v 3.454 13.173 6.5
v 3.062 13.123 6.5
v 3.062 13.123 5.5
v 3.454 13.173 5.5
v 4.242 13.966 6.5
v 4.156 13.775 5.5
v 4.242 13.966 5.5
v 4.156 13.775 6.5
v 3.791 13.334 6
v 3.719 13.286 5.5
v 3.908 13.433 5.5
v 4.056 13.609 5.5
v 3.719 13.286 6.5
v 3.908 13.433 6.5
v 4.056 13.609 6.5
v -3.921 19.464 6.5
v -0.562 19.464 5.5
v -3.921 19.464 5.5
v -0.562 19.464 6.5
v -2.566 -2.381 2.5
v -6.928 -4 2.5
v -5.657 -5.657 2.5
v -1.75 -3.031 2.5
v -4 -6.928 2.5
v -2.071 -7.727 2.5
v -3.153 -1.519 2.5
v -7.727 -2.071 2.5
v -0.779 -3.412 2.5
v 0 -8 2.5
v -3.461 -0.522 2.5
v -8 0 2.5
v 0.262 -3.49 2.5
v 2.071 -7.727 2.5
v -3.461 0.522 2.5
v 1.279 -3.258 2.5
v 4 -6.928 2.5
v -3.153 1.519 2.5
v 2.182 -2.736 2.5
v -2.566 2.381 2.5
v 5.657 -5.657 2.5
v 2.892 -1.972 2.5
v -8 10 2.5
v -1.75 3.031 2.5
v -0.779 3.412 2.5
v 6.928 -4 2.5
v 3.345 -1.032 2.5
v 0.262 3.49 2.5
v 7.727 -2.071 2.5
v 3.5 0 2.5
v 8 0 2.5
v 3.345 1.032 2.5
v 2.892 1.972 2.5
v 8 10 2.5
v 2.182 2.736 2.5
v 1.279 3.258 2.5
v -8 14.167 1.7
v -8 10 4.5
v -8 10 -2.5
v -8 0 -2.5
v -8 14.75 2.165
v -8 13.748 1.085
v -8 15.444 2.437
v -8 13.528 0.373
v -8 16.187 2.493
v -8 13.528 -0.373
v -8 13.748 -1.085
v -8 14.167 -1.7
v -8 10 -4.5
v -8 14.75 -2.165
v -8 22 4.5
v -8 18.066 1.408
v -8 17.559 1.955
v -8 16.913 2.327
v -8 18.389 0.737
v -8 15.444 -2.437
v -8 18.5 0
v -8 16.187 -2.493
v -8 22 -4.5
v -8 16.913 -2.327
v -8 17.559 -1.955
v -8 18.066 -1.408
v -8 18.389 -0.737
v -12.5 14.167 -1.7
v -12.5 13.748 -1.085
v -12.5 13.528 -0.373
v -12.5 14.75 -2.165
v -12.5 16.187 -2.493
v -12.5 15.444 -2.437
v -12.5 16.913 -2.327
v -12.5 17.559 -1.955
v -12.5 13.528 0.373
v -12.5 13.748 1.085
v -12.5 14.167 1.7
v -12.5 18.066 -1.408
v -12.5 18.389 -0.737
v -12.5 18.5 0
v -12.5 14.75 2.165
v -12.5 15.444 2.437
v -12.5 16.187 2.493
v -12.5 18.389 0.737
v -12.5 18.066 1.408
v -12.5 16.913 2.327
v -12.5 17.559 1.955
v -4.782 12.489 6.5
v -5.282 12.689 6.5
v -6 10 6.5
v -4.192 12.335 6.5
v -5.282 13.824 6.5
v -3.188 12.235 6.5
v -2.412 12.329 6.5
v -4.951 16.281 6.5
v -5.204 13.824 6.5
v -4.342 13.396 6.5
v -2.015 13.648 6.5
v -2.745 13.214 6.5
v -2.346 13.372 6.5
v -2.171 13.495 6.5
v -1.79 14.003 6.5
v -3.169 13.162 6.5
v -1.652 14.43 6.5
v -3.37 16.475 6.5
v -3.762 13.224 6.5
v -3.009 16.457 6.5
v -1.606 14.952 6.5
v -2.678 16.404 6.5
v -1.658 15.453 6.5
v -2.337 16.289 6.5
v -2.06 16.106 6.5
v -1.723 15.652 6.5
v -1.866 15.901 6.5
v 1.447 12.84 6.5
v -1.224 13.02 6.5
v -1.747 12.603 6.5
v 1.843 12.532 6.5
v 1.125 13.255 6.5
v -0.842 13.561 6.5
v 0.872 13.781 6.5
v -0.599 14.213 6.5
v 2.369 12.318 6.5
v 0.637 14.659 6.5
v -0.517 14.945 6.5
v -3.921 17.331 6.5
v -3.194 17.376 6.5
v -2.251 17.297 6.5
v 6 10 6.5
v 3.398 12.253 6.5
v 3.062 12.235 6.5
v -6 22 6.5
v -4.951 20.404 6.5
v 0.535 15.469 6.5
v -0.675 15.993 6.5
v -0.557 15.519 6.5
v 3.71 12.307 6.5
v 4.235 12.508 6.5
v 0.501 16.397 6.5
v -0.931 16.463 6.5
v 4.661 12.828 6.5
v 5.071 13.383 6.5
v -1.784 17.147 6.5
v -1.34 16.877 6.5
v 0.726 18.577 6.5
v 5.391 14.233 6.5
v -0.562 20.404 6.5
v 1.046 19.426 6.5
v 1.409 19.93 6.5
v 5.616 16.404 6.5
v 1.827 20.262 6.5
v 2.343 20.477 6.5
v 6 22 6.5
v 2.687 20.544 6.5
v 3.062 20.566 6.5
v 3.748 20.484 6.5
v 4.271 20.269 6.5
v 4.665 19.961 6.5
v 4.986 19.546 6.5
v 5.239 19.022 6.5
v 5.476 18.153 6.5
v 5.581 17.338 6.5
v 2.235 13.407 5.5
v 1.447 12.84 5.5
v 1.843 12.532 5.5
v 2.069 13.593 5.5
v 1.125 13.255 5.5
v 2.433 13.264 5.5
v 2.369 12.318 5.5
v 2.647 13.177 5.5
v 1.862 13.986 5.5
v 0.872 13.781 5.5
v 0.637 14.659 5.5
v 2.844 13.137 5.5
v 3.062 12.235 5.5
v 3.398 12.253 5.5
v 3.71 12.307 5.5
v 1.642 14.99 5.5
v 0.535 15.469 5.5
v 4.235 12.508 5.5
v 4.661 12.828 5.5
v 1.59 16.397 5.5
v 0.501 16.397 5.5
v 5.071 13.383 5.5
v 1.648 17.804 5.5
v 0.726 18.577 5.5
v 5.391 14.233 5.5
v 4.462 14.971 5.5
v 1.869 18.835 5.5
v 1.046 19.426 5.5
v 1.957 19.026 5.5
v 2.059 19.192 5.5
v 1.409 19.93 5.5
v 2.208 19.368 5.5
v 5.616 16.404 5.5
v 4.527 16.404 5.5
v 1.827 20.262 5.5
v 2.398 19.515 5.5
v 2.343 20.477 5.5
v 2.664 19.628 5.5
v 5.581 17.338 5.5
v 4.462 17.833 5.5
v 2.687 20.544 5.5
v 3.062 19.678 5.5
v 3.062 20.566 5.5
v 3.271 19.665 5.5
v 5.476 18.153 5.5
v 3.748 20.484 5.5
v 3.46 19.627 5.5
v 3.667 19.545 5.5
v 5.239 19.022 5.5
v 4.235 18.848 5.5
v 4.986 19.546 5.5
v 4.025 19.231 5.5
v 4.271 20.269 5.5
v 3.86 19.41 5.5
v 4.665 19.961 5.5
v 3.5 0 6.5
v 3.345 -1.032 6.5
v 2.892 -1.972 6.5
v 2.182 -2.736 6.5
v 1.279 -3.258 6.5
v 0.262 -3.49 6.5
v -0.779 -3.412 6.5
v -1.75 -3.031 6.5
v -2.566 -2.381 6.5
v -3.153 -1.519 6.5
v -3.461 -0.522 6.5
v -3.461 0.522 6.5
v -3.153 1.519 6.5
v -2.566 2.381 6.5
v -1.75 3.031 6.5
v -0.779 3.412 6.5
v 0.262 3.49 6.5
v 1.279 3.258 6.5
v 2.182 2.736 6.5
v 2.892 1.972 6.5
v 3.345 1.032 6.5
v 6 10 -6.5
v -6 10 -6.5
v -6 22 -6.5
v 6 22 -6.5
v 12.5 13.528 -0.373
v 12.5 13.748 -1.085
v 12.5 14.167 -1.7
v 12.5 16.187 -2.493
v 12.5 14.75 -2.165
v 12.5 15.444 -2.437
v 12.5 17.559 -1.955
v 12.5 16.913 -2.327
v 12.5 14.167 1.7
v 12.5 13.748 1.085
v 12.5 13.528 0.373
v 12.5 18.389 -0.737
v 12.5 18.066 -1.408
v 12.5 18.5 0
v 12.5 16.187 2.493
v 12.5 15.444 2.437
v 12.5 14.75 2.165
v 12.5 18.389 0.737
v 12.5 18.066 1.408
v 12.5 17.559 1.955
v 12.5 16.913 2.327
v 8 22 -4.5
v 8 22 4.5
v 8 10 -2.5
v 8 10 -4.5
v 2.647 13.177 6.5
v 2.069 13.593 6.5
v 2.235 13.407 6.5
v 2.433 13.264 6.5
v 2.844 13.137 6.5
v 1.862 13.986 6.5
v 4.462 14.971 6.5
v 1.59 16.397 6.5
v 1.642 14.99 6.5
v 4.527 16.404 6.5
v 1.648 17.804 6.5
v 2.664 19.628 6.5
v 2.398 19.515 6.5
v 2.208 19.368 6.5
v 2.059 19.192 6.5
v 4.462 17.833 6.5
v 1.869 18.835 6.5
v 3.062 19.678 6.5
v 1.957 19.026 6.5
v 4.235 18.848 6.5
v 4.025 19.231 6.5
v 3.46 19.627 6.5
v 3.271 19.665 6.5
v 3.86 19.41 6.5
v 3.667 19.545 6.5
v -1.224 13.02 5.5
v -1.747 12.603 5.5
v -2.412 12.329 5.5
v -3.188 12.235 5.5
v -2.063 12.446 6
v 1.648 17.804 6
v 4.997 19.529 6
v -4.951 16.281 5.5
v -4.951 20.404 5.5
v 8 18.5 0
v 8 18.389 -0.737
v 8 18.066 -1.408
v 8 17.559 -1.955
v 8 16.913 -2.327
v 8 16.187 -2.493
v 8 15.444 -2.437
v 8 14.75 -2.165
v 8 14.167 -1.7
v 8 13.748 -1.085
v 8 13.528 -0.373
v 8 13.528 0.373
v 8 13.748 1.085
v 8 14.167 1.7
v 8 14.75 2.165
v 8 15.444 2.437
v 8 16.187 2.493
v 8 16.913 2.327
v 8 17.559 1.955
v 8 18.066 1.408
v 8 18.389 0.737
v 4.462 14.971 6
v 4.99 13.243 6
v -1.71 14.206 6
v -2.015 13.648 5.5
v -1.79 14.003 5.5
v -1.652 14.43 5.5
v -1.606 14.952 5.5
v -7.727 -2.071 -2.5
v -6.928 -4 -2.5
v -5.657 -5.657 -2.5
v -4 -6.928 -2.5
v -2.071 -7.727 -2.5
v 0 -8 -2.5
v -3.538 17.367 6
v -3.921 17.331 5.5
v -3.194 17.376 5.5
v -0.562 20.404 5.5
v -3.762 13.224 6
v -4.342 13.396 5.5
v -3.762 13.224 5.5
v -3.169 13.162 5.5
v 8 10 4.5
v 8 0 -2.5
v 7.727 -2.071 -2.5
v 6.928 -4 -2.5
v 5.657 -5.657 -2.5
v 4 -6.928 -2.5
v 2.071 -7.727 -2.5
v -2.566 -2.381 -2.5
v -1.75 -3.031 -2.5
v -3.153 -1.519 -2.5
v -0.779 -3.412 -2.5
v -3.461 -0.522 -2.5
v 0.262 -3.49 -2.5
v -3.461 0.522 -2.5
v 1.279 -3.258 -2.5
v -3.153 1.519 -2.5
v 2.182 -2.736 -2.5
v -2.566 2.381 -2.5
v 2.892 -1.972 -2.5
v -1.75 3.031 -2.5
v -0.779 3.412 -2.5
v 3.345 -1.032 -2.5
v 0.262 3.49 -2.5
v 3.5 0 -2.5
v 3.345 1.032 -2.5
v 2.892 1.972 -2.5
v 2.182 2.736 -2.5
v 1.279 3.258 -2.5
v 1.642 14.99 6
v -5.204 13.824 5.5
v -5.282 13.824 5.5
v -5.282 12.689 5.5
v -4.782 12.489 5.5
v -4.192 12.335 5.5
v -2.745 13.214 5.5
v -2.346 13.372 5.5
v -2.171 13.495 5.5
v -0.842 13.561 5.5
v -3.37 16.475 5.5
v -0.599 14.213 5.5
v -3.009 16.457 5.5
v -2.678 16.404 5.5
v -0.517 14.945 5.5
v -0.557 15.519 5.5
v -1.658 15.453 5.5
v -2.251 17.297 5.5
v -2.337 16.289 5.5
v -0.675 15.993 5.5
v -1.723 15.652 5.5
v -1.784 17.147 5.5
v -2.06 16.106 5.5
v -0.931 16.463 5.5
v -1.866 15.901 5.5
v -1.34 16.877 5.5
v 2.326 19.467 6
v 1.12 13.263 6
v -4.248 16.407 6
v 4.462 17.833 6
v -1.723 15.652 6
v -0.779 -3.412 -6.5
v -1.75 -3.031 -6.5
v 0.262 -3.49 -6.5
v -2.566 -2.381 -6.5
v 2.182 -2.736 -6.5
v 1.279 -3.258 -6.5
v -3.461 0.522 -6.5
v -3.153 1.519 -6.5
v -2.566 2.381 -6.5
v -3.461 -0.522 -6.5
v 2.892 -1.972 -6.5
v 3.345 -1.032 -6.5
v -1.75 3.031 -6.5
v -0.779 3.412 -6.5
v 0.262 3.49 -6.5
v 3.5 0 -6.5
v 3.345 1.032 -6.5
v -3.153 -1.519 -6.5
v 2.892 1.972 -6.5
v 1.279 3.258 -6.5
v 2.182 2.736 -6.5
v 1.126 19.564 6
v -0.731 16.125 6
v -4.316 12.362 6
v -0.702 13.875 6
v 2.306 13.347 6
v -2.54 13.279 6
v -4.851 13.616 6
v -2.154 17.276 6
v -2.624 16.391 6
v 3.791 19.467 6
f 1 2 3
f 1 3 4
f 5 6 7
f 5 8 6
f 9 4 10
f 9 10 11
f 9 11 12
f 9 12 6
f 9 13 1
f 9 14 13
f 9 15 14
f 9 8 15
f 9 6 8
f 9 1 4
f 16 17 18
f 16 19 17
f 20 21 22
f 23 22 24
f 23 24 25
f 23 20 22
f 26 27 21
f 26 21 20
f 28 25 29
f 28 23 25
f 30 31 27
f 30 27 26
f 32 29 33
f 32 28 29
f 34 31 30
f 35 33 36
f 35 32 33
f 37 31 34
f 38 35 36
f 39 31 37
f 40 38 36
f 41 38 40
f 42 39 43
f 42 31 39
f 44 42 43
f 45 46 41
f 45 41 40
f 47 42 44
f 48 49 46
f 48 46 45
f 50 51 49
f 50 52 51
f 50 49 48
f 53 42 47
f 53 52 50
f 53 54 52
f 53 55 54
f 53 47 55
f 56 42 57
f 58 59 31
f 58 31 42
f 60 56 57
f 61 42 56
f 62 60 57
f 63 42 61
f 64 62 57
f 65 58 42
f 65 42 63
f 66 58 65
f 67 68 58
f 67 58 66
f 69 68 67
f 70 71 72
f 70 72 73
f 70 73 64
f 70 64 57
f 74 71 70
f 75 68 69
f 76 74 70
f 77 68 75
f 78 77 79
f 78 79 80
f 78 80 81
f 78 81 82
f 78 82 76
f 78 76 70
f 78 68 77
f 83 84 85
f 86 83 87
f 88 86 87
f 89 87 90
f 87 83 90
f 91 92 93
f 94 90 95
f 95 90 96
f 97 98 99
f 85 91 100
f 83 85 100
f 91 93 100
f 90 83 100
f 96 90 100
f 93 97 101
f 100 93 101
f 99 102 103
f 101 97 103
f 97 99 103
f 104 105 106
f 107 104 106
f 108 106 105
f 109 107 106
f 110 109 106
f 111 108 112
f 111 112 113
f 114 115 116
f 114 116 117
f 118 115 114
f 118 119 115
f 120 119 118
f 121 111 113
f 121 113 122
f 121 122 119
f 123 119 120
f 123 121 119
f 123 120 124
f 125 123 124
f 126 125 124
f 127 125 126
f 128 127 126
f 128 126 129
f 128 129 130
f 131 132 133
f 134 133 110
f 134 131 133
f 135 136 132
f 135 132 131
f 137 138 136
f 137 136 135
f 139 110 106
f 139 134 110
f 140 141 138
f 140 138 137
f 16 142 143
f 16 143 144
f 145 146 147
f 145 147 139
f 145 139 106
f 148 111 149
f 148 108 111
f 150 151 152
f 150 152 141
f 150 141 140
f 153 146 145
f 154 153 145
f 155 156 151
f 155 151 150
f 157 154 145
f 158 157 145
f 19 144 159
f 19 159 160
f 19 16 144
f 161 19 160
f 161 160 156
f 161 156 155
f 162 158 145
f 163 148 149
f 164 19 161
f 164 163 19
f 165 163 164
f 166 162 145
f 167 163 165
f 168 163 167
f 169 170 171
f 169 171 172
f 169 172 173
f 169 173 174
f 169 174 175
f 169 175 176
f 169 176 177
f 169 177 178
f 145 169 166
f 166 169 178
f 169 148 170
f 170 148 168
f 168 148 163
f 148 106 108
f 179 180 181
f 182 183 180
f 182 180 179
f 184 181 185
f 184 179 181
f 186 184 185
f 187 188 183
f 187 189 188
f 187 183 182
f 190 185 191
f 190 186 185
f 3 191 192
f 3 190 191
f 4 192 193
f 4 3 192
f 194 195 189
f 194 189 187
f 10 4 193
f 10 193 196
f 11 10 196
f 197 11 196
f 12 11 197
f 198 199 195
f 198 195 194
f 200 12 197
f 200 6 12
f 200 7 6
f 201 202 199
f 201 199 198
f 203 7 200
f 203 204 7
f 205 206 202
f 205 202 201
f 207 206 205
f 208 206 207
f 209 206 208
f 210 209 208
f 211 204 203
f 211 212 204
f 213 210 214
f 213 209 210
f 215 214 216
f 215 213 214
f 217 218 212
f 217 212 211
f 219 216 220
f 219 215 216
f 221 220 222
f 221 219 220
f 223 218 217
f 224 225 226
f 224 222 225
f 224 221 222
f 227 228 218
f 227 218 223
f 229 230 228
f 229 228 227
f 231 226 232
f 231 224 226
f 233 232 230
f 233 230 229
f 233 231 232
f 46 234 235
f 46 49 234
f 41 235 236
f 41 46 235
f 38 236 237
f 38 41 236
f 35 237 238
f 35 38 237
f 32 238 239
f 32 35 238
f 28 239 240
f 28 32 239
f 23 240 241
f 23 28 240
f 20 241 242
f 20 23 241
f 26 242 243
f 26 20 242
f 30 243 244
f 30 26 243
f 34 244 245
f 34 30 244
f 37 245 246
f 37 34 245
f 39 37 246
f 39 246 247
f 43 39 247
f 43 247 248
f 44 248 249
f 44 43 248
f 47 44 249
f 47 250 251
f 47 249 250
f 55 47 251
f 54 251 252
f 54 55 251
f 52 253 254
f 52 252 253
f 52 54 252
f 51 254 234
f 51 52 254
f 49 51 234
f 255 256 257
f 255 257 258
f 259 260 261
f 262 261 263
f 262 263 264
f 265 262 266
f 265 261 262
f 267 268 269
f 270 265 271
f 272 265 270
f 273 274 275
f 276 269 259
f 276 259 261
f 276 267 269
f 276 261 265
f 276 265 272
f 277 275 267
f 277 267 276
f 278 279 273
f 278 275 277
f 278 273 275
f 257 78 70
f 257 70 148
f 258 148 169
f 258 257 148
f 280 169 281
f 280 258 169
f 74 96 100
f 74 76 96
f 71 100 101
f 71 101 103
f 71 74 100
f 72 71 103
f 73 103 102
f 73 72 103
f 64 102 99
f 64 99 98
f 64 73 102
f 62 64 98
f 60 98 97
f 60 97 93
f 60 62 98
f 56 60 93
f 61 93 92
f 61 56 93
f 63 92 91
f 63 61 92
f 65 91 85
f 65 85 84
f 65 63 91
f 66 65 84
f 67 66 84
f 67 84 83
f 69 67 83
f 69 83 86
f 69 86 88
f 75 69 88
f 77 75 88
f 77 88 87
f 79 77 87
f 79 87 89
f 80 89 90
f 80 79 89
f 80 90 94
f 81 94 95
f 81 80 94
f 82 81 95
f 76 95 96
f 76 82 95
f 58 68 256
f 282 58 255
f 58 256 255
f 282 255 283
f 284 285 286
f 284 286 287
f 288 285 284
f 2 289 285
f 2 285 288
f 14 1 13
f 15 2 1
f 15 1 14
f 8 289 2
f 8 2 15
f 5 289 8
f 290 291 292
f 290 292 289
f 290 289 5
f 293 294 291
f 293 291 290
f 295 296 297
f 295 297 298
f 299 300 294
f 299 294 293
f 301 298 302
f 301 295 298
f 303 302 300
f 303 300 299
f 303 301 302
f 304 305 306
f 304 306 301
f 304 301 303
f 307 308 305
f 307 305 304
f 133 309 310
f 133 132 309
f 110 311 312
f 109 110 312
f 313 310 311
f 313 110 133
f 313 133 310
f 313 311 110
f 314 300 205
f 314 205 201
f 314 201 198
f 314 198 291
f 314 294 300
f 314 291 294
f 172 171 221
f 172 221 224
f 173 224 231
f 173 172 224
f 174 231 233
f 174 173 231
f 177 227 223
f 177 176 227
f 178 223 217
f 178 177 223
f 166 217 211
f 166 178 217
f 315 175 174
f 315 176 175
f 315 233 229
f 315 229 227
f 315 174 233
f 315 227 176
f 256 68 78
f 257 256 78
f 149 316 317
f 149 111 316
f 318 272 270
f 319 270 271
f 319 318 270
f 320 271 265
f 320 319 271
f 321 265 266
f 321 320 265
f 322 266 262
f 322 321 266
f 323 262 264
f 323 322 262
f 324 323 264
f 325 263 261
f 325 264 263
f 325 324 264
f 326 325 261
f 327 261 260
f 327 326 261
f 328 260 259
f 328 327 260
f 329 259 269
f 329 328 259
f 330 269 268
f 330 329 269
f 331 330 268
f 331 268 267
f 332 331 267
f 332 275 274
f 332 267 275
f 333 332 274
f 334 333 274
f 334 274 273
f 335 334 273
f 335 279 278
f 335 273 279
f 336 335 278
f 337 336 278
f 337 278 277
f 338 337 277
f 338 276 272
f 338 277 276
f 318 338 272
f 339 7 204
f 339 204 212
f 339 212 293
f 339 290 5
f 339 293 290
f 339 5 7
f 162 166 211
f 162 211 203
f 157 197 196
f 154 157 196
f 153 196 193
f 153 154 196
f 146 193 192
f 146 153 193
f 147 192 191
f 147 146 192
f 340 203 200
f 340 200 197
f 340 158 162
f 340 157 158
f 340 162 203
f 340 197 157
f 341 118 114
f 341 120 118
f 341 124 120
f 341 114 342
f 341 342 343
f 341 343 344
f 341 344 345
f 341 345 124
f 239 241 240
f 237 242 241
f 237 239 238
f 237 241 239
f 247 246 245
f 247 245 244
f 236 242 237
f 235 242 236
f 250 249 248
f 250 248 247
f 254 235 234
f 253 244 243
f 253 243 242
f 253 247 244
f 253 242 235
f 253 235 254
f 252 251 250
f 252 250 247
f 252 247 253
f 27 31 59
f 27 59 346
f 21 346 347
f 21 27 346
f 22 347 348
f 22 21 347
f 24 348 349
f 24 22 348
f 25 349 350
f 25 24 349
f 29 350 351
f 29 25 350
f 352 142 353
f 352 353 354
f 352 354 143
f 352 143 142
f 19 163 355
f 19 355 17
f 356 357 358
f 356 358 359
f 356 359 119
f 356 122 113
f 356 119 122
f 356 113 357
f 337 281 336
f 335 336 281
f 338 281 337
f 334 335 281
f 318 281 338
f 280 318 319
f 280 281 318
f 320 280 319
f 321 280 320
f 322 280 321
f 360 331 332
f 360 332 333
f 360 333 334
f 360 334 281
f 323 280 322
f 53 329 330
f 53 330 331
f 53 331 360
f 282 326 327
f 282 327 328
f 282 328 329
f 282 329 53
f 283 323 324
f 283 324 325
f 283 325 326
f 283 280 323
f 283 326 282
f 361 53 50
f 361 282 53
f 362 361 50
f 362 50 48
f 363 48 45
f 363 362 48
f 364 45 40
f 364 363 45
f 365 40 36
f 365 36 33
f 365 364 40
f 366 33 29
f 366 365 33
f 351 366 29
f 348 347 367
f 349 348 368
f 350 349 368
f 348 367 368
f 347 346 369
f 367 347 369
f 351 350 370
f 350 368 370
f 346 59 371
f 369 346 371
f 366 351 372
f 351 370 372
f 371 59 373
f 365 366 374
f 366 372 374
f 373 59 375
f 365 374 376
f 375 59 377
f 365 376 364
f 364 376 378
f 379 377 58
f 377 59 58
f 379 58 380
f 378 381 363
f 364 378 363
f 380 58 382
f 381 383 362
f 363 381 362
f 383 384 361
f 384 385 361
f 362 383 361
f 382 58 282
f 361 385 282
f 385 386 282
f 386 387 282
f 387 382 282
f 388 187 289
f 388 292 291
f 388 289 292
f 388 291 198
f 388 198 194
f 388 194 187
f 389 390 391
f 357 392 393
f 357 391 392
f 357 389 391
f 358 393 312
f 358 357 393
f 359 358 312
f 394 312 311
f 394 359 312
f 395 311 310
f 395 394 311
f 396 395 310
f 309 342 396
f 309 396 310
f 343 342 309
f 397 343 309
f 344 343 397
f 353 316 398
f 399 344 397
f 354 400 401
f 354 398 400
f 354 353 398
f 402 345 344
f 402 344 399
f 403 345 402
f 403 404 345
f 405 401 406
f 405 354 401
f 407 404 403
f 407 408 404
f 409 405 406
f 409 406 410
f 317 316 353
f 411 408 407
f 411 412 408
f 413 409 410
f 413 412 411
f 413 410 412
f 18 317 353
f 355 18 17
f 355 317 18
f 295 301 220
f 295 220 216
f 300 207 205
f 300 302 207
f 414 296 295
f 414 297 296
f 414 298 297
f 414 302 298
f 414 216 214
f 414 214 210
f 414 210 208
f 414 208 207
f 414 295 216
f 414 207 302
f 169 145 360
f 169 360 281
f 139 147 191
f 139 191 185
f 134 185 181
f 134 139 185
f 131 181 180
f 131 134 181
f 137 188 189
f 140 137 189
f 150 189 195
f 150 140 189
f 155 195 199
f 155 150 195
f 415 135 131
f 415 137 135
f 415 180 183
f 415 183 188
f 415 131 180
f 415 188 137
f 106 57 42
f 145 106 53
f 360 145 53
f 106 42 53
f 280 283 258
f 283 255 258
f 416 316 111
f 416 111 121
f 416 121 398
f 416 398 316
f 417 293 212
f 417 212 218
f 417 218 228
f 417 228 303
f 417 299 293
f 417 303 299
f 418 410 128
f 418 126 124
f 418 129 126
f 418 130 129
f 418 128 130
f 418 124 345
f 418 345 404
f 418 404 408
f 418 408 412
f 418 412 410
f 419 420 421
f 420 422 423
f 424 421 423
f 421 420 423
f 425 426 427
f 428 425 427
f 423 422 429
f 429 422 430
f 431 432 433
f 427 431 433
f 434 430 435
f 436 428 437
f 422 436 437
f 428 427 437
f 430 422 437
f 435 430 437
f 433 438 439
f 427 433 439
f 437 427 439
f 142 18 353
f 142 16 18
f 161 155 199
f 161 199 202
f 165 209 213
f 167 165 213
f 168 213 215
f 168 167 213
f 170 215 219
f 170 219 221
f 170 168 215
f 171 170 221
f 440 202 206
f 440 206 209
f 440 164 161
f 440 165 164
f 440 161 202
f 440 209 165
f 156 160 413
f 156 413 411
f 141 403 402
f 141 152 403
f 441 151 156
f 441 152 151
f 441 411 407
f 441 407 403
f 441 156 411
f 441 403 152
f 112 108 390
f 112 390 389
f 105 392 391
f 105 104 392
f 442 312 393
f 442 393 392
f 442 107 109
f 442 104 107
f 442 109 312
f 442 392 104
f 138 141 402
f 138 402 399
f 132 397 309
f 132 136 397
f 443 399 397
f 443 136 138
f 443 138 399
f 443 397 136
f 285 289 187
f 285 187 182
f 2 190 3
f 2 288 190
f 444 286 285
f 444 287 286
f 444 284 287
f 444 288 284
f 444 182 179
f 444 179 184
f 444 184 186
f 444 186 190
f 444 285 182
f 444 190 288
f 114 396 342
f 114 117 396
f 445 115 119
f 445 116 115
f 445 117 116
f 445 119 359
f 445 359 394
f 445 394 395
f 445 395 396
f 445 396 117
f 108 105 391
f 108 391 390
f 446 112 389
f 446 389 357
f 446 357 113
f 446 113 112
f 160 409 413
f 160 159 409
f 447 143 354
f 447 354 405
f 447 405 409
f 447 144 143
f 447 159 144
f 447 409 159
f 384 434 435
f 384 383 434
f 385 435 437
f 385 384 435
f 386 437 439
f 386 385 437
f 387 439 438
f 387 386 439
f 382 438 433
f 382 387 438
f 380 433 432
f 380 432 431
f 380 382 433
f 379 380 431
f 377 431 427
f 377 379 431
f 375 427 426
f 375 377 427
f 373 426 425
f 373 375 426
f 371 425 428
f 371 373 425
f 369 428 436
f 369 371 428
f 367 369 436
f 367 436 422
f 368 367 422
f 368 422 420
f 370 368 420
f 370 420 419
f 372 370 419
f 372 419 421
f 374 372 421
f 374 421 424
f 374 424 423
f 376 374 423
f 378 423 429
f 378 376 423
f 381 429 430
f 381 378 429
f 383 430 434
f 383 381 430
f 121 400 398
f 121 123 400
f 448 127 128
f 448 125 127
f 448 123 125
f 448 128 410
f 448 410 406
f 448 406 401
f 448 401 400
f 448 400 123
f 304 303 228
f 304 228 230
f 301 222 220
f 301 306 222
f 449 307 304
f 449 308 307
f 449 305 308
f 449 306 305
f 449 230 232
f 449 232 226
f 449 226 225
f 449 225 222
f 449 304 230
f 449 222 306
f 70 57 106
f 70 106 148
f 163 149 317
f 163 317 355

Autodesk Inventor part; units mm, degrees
ref_plane "YZ Plane" through (0, 0, 0) normal (1, 0, 0) x (0, 1, 0)
ref_plane "XZ Plane" through (0, 0, 0) normal (0, 1, 0) x (-1, 0, 0)
ref_plane "XY Plane" through (0, 0, 0) normal (0, 0, 1) x (1, 0, 0)
sketch "스케치1" plane through (0, 0, 0) normal (0, 0, 1) x (1, 0, 0)
  circle A0 centre (0, 0) radius 3.5
  line L0 (-8, 22) -> (8, 22)
  line L1 (8, 22) -> (8, -8)
  line L2 (8, -8) -> (-8, -8)
  line L3 (-8, -8) -> (-8, 22)
  line L4 (-8, 10) -> (8, 10)
  dimension "d0" = 7
  dimension "d2" = 16
  dimension "d3" = 8
  dimension "d4" = 30
  dimension "d5" = 22
  dimension "d6" = 12
extrude "돌출1" add sketch "스케치1" along normal mid plane 13 contours A0
extrude "돌출2" add sketch "스케치1" along normal mid plane 5 contours L4 L1 L2 L3
extrude "돌출3" add sketch "스케치1" along normal mid plane 13 contours L0 L1 L4 L3
sketch "스케치2" plane through (8, -8, 2.5) normal (1, 0, 0) x (0, 0, -1)
  line L0 (9, 30) -> (-4, 30) projected
  line L1 (-4, 18) -> (-4, 30) projected
  point P0 (2.5, 8)
sketch "스케치3" plane through (0, 0, 0) normal (1, 0, 0) x (0, 1, 0)
  circle A0 centre (16, 0) radius 2.5
  line L0 (22, 6.5) -> (22, -6.5) projected
  line L1 (22, 6.5) -> (10, 6.5) projected
  point P0 (0, 0)
  dimension "d16" = 5
  dimension "d17" = 6
  dimension "d18" = 6.5
extrude "돌출4" add sketch "스케치3" along normal mid plane 25
fillet "모깎기1" radius 8 2 edges at (8, -8, 0) (-8, -8, 0)
chamfer "모따기1" distance 2 angle 45 4 edges at (8, 16, 6.5) (8, 16, -6.5) (-8, 16, 6.5) (-8, 16, -6.5)
sketch "스케치4" plane through (0, 0, 6.5) normal (0, 0, 1) x (1, 0, 0)
  line L0 (-5.9498, 20.5659) -> (5.0498, 20.5659) construction
  line L1 (5.0498, 20.5659) -> (5.0498, 12.6328) construction
  line L2 (5.0498, 12.6328) -> (-5.9498, 12.6328) construction
  line L3 (-5.9498, 12.6328) -> (-5.9498, 20.5659) construction
  spline S0 degree 2 poles (-0.517, 14.9451) (-0.517, 14.3681) (-0.8866, 13.3827) (-1.2237, 13.0197) knots 0 0 0 1 2 2 2
  spline S1 degree 2 poles (-1.2237, 13.0197) (-1.5608, 12.6566) (-2.5657, 12.2352) (-3.188, 12.2352) knots 0 0 0 1 2 2 2
  spline S2 degree 2 poles (-3.188, 12.2352) (-3.7585, 12.2352) (-4.8736, 12.4881) (-5.282, 12.689) knots 0 0 0 1 2 2 2
  line L4 (-5.282, 12.689) -> (-5.282, 13.8236)
  line L5 (-5.282, 13.8236) -> (-5.2042, 13.8236)
  spline S3 degree 2 poles (-5.2042, 13.8236) (-5.081, 13.7328) (-4.6208, 13.4994) (-4.342, 13.3957) knots 0 0 0 1 2 2 2
  spline S4 degree 2 poles (-4.342, 13.3957) (-4.0243, 13.2855) (-3.4992, 13.1623) (-3.1686, 13.1623) knots 0 0 0 1 2 2 2
  spline S5 degree 2 poles (-3.1686, 13.1623) (-2.8444, 13.1623) (-2.235, 13.3957) (-2.0146, 13.6485) knots 0 0 0 1 2 2 2
  spline S6 degree 2 poles (-2.0146, 13.6485) (-1.8136, 13.8884) (-1.6062, 14.5237) (-1.6062, 14.9516) knots 0 0 0 1 2 2 2
  spline S7 degree 2 poles (-1.6062, 14.9516) (-1.6062, 15.3795) (-1.8396, 15.9241) (-2.06, 16.1056) knots 0 0 0 1 2 2 2
  spline S8 degree 2 poles (-2.06, 16.1056) (-2.2869, 16.3066) (-2.9611, 16.4751) (-3.3695, 16.4751) knots 0 0 0 1 2 2 2
  spline S9 degree 2 poles (-3.3695, 16.4751) (-3.8104, 16.4751) (-4.6856, 16.339) (-4.9514, 16.2806) knots 0 0 0 1 2 2 2
  line L6 (-4.9514, 16.2806) -> (-4.9514, 20.4038)
  line L7 (-4.9514, 20.4038) -> (-0.5624, 20.4038)
  line L8 (-0.5624, 20.4038) -> (-0.5624, 19.4638)
  line L9 (-0.5624, 19.4638) -> (-3.9206, 19.4638)
  line L10 (-3.9206, 19.4638) -> (-3.9206, 17.3309)
  spline S10 degree 2 poles (-3.9206, 17.3309) (-3.7261, 17.3568) (-3.3501, 17.3762) (-3.1945, 17.3762) knots 0 0 0 1 2 2 2
  spline S11 degree 2 poles (-3.1945, 17.3762) (-2.5786, 17.3762) (-1.7293, 17.1753) (-1.3404, 16.8771) knots 0 0 0 1 2 2 2
  spline S12 degree 2 poles (-1.3404, 16.8771) (-0.9449, 16.5788) (-0.517, 15.6712) (-0.517, 14.9451) knots 0 0 0 1 2 2 2
  spline S13 degree 2 poles (5.6159, 16.4038) (5.6159, 14.2514) (4.3647, 12.2352) (3.0616, 12.2352) knots 0 0 0 1 2 2 2
  spline S14 degree 2 poles (3.0616, 12.2352) (1.739, 12.2352) (0.5008, 14.2903) (0.5008, 16.3973) knots 0 0 0 1 2 2 2
  spline S15 degree 2 poles (0.5008, 16.3973) (0.5008, 18.5626) (1.752, 20.5659) (3.0616, 20.5659) knots 0 0 0 1 2 2 2
  spline S16 degree 2 poles (3.0616, 20.5659) (4.3776, 20.5659) (5.6159, 18.4913) (5.6159, 16.4038) knots 0 0 0 1 2 2 2
  spline S17 degree 2 poles (4.2415, 13.9662) (4.3971, 14.3617) (4.5267, 15.5805) (4.5267, 16.4038) knots 0 0 0 1 2 2 2
  spline S18 degree 2 poles (4.5267, 16.4038) (4.5267, 17.2271) (4.3971, 18.4395) (4.235, 18.8479) knots 0 0 0 1 2 2 2
  spline S19 degree 2 poles (4.235, 18.8479) (4.0729, 19.2563) (3.5089, 19.6777) (3.0616, 19.6777) knots 0 0 0 1 2 2 2
  spline S20 degree 2 poles (3.0616, 19.6777) (2.6143, 19.6777) (2.0373, 19.2563) (1.8687, 18.8349) knots 0 0 0 1 2 2 2
  spline S21 degree 2 poles (1.8687, 18.8349) (1.7066, 18.4265) (1.5899, 17.1818) (1.5899, 16.3973) knots 0 0 0 1 2 2 2
  spline S22 degree 2 poles (1.5899, 16.3973) (1.5899, 15.5545) (1.6937, 14.4265) (1.8622, 13.9856) knots 0 0 0 1 2 2 2
  spline S23 degree 2 poles (1.8622, 13.9856) (2.0178, 13.5707) (2.5948, 13.1234) (3.0616, 13.1234) knots 0 0 0 1 2 2 2
  spline S24 degree 2 poles (3.0616, 13.1234) (3.5024, 13.1234) (4.0794, 13.5448) (4.2415, 13.9662) knots 0 0 0 1 2 2 2
  point P0 (0, 0)
extrude "돌출5" cut sketch "스케치4" against normal blind 1
properties part number "1번부품"
